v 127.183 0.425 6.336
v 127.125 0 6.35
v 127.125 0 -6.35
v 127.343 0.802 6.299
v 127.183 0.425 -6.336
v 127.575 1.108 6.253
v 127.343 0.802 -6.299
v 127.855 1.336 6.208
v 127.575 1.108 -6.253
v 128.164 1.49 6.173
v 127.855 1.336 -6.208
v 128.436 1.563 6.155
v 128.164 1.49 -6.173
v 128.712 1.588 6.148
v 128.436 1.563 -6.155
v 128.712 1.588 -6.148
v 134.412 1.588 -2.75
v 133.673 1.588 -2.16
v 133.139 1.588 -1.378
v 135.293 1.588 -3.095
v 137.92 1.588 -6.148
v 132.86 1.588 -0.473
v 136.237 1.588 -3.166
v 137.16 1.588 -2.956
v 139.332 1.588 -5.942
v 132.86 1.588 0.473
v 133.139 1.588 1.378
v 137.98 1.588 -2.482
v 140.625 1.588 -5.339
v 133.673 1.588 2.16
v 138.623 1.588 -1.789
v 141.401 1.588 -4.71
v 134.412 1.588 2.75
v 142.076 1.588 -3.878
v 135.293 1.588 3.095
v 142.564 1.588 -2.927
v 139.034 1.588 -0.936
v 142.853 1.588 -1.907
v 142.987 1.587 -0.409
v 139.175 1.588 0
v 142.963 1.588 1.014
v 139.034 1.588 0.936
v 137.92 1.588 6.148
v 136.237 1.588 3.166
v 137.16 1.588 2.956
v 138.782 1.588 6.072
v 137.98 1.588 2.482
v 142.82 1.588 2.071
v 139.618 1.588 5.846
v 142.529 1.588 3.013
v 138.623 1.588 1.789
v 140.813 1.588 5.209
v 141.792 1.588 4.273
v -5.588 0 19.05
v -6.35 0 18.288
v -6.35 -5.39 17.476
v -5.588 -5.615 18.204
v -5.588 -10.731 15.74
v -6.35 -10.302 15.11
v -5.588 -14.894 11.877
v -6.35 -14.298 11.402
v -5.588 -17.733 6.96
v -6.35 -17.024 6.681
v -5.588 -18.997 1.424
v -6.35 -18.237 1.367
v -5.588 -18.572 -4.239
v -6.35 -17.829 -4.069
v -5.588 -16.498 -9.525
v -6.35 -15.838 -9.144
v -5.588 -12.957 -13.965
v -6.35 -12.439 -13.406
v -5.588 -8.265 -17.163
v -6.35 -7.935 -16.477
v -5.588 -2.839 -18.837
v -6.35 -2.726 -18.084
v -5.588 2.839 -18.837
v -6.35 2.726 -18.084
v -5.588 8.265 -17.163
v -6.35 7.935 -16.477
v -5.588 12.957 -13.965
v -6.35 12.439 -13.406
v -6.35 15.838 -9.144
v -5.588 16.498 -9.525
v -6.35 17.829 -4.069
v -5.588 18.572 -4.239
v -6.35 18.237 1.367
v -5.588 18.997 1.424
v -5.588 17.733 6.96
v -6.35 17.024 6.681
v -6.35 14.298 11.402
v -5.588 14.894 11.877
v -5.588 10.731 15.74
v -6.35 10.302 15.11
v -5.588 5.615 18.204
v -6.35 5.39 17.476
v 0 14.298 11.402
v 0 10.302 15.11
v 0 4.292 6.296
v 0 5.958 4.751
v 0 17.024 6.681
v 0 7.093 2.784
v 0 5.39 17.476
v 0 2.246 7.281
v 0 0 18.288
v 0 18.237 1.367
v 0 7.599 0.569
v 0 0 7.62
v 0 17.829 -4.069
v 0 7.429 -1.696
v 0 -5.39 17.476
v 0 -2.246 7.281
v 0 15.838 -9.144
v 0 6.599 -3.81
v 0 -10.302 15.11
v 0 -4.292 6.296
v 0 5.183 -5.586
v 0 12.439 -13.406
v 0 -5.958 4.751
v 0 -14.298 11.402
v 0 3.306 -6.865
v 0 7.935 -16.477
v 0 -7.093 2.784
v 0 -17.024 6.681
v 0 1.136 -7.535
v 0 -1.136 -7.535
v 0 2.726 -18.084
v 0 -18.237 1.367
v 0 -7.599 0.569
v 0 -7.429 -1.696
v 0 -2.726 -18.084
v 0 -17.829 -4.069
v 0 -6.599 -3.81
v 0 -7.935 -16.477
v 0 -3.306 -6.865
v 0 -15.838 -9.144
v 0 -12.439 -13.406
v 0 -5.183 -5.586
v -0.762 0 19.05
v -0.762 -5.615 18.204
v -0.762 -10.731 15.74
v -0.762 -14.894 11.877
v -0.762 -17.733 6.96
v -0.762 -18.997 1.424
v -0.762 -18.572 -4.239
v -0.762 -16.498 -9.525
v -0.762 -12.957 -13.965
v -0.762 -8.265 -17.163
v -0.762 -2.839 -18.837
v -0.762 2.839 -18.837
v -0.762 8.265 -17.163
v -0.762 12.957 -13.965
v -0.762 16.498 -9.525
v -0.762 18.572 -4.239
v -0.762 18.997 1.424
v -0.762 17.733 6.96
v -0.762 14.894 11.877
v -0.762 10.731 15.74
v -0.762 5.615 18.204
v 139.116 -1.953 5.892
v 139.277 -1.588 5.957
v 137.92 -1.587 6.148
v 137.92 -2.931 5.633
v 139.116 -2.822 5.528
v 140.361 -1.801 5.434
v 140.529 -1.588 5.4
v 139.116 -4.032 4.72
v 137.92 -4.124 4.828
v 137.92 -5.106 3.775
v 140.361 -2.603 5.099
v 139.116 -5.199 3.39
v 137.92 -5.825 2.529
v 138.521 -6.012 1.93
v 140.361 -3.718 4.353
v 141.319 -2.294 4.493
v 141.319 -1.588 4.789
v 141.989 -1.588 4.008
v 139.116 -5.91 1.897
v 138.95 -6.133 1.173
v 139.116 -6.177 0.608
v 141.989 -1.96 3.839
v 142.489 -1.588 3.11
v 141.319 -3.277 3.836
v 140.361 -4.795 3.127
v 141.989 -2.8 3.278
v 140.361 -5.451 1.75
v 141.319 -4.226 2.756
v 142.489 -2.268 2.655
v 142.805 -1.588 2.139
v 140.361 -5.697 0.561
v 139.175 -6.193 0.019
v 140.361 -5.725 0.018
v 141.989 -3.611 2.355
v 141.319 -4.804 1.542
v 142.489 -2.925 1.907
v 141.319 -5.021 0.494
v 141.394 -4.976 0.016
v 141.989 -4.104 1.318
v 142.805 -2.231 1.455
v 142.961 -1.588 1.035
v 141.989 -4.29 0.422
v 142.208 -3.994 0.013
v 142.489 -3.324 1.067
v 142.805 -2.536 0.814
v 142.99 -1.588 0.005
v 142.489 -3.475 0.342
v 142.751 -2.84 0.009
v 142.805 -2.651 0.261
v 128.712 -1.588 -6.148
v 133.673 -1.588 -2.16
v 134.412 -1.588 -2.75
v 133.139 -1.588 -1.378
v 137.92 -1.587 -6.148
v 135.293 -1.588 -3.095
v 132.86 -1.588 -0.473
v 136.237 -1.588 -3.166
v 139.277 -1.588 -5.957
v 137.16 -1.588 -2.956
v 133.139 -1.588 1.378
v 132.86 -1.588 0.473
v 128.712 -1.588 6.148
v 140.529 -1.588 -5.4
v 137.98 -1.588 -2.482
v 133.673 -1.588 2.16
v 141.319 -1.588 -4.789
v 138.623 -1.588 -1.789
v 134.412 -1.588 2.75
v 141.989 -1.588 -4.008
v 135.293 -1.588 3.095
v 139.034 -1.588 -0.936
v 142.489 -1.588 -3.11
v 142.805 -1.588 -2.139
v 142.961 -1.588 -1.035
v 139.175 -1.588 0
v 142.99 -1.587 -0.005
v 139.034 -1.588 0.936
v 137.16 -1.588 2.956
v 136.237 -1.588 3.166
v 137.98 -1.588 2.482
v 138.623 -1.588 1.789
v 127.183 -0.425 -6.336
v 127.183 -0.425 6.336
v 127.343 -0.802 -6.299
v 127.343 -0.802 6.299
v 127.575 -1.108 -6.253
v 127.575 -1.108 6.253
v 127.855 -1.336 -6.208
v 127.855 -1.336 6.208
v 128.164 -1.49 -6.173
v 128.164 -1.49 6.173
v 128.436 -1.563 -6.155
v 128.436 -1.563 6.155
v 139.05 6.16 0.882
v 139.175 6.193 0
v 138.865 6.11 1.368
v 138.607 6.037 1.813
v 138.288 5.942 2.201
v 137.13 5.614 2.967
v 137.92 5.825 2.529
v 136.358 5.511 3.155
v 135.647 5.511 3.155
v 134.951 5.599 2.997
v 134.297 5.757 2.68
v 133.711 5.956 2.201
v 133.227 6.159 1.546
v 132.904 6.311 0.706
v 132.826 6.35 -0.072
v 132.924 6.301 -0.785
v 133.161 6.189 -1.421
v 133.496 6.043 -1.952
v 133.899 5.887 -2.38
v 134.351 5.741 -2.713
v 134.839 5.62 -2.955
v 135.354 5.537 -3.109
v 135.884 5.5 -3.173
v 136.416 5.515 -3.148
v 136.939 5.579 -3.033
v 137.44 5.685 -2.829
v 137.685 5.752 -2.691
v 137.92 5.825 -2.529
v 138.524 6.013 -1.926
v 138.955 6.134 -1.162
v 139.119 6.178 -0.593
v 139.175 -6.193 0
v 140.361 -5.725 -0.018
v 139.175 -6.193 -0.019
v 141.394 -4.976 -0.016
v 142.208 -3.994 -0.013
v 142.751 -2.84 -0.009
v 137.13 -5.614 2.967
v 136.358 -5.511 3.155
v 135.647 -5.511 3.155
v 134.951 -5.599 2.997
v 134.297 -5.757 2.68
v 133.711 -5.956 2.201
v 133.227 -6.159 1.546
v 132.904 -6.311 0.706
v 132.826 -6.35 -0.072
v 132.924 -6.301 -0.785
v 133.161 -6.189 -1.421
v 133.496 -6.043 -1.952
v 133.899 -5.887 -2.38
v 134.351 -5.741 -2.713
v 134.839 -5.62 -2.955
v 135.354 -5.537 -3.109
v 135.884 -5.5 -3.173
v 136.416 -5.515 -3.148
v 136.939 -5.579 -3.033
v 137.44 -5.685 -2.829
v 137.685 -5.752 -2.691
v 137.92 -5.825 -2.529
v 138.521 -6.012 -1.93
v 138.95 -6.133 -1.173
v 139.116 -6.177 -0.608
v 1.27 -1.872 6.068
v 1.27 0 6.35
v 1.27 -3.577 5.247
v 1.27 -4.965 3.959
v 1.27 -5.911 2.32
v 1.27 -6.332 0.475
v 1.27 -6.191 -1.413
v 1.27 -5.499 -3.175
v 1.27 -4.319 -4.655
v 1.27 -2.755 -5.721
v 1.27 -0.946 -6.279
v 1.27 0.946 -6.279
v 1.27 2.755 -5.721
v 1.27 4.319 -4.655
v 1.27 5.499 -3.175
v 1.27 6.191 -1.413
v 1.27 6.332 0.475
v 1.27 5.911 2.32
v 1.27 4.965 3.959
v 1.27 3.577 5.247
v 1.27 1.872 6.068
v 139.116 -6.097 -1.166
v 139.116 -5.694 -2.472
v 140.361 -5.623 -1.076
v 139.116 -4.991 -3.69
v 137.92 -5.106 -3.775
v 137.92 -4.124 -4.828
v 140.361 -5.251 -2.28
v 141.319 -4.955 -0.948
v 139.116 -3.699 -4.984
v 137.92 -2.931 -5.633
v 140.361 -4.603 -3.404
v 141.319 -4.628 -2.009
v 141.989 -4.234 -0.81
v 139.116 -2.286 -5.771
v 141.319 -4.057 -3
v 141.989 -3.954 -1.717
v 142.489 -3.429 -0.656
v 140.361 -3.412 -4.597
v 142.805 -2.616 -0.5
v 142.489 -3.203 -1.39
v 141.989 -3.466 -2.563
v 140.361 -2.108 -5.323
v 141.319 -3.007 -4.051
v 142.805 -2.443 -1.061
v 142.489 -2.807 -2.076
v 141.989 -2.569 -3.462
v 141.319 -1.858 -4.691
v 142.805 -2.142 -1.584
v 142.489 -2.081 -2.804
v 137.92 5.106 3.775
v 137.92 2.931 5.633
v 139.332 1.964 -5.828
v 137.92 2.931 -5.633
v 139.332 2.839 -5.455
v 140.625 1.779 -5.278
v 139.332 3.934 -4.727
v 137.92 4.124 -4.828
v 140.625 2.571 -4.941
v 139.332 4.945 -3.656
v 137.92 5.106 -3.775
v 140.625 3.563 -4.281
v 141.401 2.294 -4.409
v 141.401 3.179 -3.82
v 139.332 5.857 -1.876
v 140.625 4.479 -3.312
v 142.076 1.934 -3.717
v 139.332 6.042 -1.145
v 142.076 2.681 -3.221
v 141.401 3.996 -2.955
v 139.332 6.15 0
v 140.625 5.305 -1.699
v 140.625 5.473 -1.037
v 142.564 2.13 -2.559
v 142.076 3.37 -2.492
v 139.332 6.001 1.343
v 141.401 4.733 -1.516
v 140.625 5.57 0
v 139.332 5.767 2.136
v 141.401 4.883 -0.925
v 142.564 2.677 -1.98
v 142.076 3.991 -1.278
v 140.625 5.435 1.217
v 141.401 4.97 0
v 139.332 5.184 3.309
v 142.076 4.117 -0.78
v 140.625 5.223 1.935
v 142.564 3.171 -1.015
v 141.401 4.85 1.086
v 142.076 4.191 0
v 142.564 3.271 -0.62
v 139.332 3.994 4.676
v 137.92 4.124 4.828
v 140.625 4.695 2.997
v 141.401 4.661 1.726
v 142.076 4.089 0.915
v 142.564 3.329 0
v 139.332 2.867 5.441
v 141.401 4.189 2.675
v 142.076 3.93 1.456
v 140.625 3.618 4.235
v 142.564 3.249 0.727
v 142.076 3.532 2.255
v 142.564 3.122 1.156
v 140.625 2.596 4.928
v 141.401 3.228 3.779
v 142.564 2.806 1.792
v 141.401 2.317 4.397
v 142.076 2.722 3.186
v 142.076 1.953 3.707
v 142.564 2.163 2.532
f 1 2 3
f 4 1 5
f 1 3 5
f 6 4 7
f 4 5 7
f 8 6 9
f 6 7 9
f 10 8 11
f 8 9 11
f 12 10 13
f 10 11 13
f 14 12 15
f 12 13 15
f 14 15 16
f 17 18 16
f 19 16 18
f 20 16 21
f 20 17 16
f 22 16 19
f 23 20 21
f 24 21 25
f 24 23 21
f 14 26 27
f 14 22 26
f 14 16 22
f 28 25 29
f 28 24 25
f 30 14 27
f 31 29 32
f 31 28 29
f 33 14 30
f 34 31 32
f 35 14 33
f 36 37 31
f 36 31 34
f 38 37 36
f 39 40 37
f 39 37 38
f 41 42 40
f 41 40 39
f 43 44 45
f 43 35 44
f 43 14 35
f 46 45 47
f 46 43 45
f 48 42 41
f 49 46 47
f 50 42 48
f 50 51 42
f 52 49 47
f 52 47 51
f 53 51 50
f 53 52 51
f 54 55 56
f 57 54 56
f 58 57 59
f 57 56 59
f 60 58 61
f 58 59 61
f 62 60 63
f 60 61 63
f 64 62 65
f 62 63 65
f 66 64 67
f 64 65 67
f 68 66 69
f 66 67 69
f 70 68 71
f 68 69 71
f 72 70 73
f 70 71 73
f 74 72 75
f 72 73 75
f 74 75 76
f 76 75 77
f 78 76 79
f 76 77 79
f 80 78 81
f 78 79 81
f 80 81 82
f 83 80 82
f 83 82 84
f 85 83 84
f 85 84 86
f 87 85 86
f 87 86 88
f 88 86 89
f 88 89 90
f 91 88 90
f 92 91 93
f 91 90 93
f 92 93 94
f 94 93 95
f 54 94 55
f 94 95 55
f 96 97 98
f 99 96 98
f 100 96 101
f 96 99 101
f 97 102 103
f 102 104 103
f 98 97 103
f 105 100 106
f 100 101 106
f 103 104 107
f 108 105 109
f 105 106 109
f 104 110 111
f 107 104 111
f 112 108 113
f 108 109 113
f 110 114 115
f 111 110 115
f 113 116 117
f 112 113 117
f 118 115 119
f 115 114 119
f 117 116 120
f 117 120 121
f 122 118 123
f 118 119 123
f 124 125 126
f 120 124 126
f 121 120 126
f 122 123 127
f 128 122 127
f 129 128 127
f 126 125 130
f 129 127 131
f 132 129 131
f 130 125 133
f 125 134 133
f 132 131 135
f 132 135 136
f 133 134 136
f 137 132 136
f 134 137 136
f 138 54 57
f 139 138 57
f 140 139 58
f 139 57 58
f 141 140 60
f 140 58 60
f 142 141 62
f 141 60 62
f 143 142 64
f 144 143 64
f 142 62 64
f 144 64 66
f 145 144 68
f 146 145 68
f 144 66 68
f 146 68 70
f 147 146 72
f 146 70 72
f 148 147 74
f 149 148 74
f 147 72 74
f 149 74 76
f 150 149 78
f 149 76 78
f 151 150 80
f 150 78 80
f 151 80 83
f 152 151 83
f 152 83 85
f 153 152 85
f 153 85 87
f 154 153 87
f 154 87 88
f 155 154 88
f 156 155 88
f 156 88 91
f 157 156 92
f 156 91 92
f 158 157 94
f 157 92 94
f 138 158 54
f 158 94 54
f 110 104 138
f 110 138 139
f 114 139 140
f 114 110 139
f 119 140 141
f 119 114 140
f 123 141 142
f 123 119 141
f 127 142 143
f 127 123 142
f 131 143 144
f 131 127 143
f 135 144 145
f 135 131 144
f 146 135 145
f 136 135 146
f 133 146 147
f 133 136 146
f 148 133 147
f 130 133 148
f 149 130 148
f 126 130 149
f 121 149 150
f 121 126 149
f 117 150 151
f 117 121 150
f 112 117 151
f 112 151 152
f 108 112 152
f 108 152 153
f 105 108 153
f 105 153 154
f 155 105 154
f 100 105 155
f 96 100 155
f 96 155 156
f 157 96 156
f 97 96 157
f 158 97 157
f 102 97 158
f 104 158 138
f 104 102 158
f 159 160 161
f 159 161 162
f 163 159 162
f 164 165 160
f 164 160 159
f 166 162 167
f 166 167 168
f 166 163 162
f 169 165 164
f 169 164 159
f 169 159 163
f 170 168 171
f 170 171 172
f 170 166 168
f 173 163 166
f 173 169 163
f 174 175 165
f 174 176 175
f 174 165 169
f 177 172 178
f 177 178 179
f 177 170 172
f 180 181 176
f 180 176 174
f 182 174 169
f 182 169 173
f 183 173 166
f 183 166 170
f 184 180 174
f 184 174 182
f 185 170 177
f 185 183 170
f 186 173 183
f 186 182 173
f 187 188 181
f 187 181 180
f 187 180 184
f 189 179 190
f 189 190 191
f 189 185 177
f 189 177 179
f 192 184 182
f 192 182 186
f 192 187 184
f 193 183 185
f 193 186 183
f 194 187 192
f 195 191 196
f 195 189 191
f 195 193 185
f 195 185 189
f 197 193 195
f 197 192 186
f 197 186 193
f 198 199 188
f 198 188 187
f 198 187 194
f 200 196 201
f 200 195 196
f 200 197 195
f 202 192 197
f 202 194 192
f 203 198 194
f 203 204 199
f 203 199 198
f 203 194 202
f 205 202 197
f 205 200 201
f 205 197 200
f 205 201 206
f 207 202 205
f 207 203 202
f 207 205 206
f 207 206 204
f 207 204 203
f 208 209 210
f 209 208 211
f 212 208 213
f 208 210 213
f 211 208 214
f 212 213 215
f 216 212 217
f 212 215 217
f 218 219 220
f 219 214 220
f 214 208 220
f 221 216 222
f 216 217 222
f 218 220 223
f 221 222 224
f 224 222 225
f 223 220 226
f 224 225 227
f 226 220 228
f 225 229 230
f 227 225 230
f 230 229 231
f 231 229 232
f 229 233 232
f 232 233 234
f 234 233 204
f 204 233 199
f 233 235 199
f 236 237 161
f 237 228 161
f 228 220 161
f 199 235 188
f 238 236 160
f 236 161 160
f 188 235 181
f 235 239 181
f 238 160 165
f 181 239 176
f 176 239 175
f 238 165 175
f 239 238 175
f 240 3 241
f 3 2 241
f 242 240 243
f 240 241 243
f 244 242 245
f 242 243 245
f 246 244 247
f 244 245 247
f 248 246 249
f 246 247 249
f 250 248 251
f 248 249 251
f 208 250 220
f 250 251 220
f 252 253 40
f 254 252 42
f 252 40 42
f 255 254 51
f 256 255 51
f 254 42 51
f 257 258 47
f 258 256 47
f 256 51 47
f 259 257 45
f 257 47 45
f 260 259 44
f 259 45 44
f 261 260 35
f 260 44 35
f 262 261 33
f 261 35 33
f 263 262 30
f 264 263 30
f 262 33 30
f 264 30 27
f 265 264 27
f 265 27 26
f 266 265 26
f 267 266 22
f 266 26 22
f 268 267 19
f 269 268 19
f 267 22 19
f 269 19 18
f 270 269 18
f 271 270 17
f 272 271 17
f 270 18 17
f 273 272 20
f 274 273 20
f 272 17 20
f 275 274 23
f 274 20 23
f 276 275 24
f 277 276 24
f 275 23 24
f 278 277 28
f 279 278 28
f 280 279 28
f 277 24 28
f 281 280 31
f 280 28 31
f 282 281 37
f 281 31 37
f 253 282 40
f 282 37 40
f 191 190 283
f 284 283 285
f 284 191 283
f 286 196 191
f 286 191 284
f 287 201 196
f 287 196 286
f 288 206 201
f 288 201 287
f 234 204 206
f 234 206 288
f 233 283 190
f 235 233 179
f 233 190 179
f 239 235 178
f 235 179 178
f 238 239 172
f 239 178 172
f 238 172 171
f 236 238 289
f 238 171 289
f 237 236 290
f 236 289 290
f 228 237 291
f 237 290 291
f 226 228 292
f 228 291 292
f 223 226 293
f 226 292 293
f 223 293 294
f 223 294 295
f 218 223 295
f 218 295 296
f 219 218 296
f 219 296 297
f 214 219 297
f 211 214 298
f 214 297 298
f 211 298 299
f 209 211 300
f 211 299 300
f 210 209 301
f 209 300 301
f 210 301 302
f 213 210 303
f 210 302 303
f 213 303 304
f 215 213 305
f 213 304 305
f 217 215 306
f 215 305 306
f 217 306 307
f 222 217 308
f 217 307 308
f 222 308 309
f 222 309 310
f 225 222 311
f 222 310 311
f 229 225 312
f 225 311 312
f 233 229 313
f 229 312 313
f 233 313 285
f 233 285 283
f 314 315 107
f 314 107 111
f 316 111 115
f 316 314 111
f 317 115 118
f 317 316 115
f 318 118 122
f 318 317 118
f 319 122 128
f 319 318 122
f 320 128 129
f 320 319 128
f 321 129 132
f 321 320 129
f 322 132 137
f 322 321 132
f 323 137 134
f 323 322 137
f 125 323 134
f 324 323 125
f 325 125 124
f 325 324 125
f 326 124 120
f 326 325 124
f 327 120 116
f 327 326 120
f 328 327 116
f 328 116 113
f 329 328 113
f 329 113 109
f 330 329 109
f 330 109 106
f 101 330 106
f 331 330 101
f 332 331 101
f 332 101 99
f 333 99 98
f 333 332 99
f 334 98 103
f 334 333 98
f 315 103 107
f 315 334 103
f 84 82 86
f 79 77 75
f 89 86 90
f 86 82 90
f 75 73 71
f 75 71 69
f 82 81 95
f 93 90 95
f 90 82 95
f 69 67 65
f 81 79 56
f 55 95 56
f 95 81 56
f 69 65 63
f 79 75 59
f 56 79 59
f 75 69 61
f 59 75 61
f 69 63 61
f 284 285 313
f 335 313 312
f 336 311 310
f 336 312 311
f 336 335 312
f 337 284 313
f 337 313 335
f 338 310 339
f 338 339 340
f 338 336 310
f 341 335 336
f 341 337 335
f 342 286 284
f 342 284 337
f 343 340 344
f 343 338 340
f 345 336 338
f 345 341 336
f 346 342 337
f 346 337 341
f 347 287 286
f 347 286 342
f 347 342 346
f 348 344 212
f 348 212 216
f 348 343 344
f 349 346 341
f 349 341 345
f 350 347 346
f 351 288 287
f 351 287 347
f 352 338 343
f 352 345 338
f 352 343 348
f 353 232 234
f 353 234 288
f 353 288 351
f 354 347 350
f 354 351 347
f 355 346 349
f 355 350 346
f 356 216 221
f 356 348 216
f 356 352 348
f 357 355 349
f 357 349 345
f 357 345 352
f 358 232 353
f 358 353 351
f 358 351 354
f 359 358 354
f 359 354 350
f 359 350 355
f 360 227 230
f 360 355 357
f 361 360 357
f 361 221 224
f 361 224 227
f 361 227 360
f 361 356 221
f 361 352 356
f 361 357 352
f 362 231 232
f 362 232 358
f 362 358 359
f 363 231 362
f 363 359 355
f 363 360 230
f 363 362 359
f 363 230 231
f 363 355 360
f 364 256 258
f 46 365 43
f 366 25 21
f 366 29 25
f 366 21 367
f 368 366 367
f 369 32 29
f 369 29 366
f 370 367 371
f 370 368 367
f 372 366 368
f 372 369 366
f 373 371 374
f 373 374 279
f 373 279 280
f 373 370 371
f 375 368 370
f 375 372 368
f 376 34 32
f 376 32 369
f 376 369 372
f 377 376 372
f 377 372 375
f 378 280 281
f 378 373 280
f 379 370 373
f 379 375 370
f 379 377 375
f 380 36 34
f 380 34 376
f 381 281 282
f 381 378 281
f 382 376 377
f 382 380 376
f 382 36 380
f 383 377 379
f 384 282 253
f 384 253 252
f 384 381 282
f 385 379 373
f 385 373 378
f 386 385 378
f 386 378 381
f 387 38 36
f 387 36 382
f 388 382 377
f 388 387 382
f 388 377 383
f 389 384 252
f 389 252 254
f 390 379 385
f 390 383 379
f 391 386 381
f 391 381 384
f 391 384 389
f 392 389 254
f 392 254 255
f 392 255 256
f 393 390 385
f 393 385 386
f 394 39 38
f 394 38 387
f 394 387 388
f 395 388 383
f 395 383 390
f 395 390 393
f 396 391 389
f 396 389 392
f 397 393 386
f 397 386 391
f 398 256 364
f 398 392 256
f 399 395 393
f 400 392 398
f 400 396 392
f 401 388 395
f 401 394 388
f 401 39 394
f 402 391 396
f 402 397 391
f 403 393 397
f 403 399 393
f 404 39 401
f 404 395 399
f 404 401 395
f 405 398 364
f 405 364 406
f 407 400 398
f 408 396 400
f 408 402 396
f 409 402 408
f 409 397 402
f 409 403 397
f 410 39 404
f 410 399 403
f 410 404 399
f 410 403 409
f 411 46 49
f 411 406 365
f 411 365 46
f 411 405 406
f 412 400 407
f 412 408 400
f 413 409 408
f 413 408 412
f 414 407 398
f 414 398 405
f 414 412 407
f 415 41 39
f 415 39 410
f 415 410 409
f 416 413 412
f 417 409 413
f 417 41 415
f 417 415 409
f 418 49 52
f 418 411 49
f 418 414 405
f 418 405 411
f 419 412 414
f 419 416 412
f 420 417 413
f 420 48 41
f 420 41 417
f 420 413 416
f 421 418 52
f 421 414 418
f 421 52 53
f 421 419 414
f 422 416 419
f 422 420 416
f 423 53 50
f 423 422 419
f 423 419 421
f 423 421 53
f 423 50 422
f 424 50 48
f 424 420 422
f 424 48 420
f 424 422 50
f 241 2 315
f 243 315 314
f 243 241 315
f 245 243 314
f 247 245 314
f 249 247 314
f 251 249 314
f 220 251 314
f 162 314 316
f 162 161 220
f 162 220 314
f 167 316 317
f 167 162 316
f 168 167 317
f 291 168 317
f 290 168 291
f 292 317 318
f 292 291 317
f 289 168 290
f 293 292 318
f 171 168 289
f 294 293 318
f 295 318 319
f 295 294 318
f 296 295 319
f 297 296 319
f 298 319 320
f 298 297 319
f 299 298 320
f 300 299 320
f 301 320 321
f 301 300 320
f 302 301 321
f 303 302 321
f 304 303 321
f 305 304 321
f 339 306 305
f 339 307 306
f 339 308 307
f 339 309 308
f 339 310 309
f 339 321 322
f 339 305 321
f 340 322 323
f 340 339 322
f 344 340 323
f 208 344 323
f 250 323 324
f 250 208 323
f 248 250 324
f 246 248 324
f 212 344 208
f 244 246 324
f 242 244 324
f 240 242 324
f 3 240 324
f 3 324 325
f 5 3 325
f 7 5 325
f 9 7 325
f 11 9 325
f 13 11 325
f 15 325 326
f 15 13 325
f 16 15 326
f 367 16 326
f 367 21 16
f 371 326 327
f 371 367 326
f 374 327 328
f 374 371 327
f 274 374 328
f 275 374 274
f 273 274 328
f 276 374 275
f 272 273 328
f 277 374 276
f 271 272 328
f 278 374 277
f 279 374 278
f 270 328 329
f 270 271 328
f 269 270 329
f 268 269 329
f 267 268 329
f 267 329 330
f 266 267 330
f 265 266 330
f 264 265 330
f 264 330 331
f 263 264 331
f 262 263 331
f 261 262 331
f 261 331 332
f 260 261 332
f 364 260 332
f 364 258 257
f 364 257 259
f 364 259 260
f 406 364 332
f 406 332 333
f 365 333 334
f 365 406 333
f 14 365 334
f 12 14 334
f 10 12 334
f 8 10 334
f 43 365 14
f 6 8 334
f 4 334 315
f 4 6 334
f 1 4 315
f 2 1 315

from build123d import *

# Parameters (mm, degrees)
F0_W        = 143
F0_H        = 6.35
F2_SIZE     = 0.762
F3_SIZE     = 1.27
F4_R        = 3.175
F5_DEPTH    = 12.7
F6_W        = 15.875
F6_H        = 3.175
F7_DEPTH    = 12.7
F8_R        = 1.5874
F9_T2_ANGLE = 359.64
F9_T4_ANGLE = 359.64


# Not quite as in the source:
# - a fillet or chamfer that OpenCascade refuses, or shapes differently, is made with other operations: its cross-section is extruded or revolved along the edge and cut away or added
# - a fillet or chamfer is up to 0.001 mm smaller than in the source, because OpenCascade refuses the exact size


with BuildPart() as f1:
    # F0 (on Front) → F1 (revolve)
    with BuildSketch(Plane.XZ):
        Polygon((0, 19.05), (-6.35, 19.05), (-6.35, 0), (0, 0), (0, 6.35), align=None)
        with Locations((71.5, 3.175)):
            Rectangle(F0_W, F0_H)
    revolve(axis=Axis((71.5, 0, 0), (1, 0, 0)))

    # F2
    f2_edges = [f1.edges().sort_by_distance(p)[0] for p in [
        (0, 0, -19.05),
        (-6.35, 0, -19.05),
    ]]
    chamfer(f2_edges, length=F2_SIZE)

    # F3
    f3_edges = [f1.edges().sort_by_distance(p)[0] for p in [
        (0, 0, -6.35),
    ]]
    chamfer(f3_edges, length=F3_SIZE)

    # F4 (on Front) → F5 (cut, symmetric)
    with BuildSketch(Plane.XZ):
        with Locations((136, 0)):
            Circle(F4_R)
    extrude(amount=F5_DEPTH, both=True, mode=Mode.SUBTRACT)

    # F6 (on Top) → F7 (cut, symmetric)
    with BuildSketch(Plane.XY):
        with Locations((135.0625, 0)):
            Rectangle(F6_W, F6_H)
    extrude(amount=F7_DEPTH, both=True, mode=Mode.SUBTRACT)

    # F8 (radius 1.5875 in the source; OpenCascade refuses exactly that, so slightly less here)
    f8_edges = [f1.edges().sort_by_distance(p)[0] for p in [
        (127.125, 1.5875, 0),
        (127.125, -1.5875, 0),
    ]]
    fillet(f8_edges, radius=F8_R)

    # F9: fillet of radius 5.08 on 2 edges, made by hand

    # F9_s1 → F9_t2 (revolve, cut)
    with BuildSketch(Plane(origin=(0, 0, 0), x_dir=(1, 0, 0), z_dir=(0, -0.0031415875, 0.9999950652))):
        with BuildLine():
            ThreePointArc((137.92, -6.35), (141.5121024484, -4.8621024484), (143, -1.27))
            Line((143, -1.27), (143, -6.35))
            Line((143, -6.35), (137.92, -6.35))
        make_face()
    revolve(axis=Axis((143, 0, 0), (1, 0, 0)), revolution_arc=F9_T2_ANGLE, mode=Mode.SUBTRACT)

    # F9_s3 → F9_t4 (revolve, cut)
    with BuildSketch(Plane(origin=(0, 0, 0), x_dir=(1, 0, 0), z_dir=(0, 0.0031415875, -0.9999950652))):
        with BuildLine():
            ThreePointArc((137.92, -6.35), (141.5121024484, -4.8621024484), (143, -1.27))
            Line((143, -1.27), (143, -6.35))
            Line((143, -6.35), (137.92, -6.35))
        make_face()
    revolve(axis=Axis((143, 0, 0), (1, 0, 0)), revolution_arc=F9_T4_ANGLE, mode=Mode.SUBTRACT)


solid = f1.part
